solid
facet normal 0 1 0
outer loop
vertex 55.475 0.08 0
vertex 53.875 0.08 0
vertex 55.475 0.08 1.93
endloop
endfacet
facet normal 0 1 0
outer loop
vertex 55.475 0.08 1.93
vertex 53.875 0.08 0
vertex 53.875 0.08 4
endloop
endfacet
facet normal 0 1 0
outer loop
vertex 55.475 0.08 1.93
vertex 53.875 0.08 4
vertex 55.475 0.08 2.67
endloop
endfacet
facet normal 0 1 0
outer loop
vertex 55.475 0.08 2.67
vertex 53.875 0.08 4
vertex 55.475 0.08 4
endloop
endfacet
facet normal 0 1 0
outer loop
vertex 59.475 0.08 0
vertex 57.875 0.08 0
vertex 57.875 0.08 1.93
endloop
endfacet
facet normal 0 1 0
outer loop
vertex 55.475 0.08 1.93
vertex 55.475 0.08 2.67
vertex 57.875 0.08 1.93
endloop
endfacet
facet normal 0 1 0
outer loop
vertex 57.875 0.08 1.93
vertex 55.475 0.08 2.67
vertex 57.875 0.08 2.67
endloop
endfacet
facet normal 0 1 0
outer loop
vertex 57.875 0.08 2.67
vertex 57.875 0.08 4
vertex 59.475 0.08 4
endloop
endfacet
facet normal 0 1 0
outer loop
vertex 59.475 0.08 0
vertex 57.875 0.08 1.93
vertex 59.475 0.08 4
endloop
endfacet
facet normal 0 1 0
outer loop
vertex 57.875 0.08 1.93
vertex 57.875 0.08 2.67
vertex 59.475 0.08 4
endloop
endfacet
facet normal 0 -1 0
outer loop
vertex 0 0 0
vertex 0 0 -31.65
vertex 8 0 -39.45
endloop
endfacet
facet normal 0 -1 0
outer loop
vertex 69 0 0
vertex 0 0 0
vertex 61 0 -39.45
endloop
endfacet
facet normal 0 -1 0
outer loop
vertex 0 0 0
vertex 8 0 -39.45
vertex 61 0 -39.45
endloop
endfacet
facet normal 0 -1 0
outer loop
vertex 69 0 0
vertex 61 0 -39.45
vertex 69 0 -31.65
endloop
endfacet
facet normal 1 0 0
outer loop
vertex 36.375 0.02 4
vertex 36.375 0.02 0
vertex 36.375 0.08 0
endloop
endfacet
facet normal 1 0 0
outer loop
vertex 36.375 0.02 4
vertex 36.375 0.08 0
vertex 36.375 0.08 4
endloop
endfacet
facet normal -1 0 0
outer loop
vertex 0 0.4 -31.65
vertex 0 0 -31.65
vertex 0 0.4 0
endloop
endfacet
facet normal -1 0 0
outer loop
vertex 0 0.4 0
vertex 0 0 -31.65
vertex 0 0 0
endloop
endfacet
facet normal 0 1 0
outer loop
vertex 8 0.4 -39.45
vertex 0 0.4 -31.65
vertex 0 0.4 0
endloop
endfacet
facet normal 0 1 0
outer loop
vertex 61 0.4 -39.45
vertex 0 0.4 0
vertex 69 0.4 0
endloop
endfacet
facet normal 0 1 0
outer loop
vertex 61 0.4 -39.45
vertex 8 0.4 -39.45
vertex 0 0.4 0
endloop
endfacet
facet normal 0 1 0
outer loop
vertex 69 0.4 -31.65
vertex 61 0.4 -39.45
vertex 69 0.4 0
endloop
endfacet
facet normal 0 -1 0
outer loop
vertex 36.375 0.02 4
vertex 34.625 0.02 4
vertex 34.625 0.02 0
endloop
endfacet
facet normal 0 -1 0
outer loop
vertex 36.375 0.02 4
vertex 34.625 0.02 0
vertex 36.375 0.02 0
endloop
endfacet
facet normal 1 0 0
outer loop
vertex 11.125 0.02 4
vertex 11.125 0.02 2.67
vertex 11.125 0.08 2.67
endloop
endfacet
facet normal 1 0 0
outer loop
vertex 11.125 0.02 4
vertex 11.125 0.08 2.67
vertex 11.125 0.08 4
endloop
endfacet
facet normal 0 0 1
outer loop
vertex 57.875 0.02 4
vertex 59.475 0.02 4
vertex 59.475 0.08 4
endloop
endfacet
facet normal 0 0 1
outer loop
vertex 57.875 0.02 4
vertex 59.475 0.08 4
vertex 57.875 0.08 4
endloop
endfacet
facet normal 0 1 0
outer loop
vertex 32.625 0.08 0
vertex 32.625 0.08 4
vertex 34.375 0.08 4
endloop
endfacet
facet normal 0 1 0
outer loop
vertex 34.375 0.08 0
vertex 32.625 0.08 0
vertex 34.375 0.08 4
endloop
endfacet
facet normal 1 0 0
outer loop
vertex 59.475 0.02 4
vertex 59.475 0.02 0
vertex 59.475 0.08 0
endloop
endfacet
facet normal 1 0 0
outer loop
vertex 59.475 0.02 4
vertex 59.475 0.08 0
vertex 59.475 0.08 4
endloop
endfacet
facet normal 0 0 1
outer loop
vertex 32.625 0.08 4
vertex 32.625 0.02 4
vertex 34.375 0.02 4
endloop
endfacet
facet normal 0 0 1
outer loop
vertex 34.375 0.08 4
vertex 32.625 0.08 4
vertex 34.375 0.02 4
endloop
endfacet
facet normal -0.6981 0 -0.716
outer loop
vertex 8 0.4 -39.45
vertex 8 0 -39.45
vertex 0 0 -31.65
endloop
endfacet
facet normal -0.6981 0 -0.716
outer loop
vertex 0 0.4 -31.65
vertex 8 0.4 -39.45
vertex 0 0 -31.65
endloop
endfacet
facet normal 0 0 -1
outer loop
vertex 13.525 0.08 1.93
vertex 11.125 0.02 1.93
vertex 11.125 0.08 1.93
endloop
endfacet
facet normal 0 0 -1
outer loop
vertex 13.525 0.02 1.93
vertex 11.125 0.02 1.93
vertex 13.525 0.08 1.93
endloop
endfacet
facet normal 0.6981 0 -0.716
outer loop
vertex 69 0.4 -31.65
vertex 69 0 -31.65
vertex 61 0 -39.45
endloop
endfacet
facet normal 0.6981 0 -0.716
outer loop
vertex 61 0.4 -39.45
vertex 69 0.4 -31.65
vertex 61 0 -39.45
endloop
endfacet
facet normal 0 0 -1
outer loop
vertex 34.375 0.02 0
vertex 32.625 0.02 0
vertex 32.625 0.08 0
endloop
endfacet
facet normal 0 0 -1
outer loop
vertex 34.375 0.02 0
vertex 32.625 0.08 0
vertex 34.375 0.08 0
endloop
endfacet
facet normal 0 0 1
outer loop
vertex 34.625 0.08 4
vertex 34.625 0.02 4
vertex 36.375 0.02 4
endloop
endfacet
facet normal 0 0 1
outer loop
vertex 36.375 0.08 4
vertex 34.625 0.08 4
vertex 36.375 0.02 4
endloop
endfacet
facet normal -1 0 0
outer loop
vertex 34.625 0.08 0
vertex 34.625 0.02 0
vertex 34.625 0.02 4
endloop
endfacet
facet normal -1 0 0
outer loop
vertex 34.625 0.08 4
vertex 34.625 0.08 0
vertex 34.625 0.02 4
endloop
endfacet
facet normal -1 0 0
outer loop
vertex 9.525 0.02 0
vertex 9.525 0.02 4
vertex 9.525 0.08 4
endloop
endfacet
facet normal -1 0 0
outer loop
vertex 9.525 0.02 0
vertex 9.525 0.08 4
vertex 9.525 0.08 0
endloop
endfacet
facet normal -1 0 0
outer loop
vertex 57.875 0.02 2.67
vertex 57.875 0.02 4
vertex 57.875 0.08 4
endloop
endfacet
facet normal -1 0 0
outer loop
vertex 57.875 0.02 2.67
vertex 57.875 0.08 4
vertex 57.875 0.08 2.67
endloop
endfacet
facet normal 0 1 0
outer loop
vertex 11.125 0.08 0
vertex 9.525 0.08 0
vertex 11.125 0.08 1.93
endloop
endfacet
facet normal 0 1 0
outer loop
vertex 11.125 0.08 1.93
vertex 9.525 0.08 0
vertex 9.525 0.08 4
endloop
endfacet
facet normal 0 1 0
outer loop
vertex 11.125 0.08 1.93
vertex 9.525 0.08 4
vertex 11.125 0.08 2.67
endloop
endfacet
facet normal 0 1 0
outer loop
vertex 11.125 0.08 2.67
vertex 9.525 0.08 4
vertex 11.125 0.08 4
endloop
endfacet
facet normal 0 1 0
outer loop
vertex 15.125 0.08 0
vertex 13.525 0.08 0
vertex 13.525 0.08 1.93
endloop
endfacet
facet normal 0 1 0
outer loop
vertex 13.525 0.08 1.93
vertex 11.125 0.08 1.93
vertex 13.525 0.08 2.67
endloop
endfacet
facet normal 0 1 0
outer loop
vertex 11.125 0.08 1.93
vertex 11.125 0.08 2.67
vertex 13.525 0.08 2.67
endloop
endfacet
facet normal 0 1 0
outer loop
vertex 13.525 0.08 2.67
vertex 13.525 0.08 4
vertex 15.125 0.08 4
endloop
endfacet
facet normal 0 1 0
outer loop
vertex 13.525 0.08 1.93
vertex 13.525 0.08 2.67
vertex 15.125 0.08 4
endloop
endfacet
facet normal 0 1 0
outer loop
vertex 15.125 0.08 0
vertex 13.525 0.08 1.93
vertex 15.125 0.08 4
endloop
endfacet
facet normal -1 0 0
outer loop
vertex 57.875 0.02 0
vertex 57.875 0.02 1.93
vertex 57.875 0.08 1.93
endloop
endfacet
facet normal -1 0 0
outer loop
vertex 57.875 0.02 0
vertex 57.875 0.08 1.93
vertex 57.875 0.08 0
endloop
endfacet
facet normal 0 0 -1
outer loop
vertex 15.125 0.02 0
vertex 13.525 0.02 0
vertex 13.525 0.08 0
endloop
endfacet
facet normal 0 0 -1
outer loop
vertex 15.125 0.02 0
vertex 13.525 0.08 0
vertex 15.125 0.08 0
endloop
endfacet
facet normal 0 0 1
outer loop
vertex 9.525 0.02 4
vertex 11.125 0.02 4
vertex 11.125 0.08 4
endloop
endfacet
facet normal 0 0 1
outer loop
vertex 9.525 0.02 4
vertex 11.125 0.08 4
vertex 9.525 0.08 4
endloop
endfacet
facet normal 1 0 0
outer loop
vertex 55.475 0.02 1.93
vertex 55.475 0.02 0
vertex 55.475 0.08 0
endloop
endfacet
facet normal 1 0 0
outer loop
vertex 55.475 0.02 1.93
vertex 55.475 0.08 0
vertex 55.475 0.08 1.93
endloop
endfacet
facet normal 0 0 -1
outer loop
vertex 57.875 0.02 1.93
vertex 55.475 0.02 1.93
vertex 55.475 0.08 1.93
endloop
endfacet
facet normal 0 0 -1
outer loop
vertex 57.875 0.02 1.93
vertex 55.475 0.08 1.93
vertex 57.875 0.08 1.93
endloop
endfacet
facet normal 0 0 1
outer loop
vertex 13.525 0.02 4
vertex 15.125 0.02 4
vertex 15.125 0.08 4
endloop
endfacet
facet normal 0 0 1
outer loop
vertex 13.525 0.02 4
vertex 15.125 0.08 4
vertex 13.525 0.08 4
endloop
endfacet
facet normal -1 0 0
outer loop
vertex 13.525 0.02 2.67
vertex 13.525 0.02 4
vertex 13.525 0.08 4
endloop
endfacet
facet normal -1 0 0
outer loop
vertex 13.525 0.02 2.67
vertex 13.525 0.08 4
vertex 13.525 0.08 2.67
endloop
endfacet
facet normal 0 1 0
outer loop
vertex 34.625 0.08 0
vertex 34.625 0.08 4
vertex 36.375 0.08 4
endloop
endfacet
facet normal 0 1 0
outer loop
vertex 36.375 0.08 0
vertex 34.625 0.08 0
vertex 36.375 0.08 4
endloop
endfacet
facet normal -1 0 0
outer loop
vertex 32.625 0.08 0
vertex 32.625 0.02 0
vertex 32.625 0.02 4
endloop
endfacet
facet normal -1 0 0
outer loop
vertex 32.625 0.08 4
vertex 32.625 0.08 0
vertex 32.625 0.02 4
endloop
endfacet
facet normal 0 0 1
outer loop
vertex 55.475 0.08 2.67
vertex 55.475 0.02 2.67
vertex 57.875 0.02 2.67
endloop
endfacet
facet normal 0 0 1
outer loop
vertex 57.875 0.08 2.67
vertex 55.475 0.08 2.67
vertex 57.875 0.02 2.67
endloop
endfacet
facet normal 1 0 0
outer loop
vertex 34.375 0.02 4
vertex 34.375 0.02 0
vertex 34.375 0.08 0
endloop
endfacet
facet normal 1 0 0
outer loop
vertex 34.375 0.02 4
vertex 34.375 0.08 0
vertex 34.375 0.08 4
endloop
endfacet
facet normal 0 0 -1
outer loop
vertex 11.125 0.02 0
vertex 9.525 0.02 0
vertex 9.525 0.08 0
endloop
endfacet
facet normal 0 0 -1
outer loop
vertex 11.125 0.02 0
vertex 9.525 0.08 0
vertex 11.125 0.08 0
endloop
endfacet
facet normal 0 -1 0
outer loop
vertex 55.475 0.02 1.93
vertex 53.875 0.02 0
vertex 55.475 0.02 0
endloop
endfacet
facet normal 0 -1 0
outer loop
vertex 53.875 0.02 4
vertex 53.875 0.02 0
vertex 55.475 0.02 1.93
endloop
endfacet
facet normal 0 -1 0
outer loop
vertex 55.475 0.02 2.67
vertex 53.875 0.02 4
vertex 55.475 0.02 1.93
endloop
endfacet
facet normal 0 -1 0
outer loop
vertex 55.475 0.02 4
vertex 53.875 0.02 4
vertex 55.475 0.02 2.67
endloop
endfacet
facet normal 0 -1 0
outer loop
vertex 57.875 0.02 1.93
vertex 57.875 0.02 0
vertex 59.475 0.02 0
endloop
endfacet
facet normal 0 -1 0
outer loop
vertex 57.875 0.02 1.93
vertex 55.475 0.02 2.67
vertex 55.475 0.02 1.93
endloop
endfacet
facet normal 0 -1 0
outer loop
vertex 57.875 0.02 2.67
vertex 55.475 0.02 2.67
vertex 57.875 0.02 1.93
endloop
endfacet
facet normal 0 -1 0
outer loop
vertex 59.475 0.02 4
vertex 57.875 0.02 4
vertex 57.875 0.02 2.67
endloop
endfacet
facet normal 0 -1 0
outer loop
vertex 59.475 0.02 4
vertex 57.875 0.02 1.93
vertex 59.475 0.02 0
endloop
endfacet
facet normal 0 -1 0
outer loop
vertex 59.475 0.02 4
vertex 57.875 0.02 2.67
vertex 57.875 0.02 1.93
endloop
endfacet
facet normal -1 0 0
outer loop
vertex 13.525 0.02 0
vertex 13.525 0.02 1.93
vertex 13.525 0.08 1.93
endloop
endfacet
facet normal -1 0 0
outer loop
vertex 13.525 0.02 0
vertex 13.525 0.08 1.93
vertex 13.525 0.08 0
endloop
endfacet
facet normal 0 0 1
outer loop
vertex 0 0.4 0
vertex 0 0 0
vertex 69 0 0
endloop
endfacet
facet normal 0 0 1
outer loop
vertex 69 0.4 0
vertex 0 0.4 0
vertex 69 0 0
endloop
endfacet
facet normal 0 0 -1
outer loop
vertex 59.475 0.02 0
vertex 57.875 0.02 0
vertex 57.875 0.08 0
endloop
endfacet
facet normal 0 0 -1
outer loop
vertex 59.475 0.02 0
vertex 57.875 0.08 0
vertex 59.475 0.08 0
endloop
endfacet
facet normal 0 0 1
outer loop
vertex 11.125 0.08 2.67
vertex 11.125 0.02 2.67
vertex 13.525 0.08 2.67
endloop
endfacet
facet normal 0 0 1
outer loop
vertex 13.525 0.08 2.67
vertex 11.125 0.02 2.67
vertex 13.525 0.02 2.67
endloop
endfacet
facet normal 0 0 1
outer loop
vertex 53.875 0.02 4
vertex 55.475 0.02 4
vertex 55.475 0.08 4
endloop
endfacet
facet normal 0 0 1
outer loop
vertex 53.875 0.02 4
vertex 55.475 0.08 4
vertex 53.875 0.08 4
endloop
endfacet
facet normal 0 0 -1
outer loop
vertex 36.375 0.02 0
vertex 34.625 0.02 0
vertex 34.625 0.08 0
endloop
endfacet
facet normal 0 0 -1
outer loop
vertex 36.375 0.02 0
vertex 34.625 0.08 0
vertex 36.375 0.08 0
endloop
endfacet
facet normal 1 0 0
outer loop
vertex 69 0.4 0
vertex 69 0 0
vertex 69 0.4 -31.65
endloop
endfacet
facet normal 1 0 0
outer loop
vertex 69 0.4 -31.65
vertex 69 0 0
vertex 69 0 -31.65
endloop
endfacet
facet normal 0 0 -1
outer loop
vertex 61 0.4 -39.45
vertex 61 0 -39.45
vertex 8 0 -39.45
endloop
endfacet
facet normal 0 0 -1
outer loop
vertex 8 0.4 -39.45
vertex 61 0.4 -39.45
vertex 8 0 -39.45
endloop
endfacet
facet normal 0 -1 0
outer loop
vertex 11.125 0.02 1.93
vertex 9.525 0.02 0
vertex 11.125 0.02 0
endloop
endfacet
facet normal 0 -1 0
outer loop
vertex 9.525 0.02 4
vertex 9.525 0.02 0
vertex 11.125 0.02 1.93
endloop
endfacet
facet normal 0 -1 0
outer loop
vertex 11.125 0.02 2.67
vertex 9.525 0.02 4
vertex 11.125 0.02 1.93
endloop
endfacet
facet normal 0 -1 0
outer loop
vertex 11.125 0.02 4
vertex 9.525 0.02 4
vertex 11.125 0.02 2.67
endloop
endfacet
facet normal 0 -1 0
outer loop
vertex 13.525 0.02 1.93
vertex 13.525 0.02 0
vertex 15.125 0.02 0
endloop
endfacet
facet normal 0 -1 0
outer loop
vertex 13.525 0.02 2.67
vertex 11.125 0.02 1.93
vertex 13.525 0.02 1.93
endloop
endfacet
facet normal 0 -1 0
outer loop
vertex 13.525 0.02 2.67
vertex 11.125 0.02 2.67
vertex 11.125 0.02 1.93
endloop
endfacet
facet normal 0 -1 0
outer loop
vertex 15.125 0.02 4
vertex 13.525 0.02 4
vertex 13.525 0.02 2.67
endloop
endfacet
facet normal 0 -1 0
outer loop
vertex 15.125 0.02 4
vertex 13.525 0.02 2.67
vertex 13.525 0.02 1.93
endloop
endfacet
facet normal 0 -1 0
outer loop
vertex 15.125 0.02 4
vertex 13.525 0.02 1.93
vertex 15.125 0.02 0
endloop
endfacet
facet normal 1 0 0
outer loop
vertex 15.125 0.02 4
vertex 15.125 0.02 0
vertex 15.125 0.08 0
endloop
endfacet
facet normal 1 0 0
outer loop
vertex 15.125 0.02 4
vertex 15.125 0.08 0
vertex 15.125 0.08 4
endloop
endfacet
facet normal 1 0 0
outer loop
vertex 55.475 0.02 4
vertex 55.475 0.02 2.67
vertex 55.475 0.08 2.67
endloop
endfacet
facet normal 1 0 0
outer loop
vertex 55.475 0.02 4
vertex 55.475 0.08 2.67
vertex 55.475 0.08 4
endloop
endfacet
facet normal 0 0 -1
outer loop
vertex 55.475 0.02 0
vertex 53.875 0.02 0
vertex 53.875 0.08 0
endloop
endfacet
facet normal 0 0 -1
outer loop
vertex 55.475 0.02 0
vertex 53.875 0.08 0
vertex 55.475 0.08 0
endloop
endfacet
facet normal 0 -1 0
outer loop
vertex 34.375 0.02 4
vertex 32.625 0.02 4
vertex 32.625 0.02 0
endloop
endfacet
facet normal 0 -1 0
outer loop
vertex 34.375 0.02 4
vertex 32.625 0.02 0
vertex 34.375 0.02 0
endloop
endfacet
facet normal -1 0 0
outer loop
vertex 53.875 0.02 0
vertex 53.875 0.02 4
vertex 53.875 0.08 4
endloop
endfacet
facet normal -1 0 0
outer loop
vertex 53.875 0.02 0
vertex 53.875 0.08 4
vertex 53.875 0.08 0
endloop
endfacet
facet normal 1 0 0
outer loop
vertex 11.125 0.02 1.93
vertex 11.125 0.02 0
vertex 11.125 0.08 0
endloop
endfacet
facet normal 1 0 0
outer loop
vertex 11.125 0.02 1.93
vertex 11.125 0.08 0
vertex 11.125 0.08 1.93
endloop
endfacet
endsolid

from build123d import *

# Parameters (mm, degrees)
BOSS_EXTRUDE1_DEPTH = 0.4
SKETCH2_W           = 2.4
SKETCH2_H           = 0.74
SKETCH2_W_2         = 1.75
SKETCH2_H_2         = 4
BOSS_EXTRUDE2_DEPTH = 0.06


with BuildPart() as part:
    # Sketch1 → Boss-Extrude1 (new body)
    with BuildSketch(Plane(origin=(0, 0, 0), x_dir=(1, 0, 0), z_dir=(0, 1, 0))):
        Polygon((8, 39.45), (0, 31.65), (0, 0), (69, 0), (69, 31.65), (61, 39.45), align=None)
    extrude(amount=BOSS_EXTRUDE1_DEPTH)


with BuildPart() as body_2:
    # Sketch2 → Boss-Extrude2 (new body)
    with BuildSketch(Plane.XZ.offset(-0.02)):
        Polygon((9.525, 4), (9.525, 0), (11.125, 0), (11.125, 1.93), (11.125, 2.67), (11.125, 4), align=None)
        Polygon((13.525, 1.93), (13.525, 0), (15.125, 0), (15.125, 4), (13.525, 4), (13.525, 2.67), align=None)
        with Locations((12.325, 2.3)):
            Rectangle(SKETCH2_W, SKETCH2_H)
        with Locations((33.5, 2)):
            Rectangle(SKETCH2_W_2, SKETCH2_H_2)
        with Locations((35.5, 2)):
            Rectangle(SKETCH2_W_2, SKETCH2_H_2)
        Polygon((53.875, 0), (55.475, 0), (55.475, 1.93), (55.475, 2.67), (55.475, 4), (53.875, 4), align=None)
        with Locations((56.675, 2.3)):
            Rectangle(SKETCH2_W, SKETCH2_H)
        Polygon((57.875, 1.93), (57.875, 0), (59.475, 0), (59.475, 4), (57.875, 4), (57.875, 2.67), align=None)
    extrude(amount=-BOSS_EXTRUDE2_DEPTH)


solid = Compound([part.part, body_2.part])
